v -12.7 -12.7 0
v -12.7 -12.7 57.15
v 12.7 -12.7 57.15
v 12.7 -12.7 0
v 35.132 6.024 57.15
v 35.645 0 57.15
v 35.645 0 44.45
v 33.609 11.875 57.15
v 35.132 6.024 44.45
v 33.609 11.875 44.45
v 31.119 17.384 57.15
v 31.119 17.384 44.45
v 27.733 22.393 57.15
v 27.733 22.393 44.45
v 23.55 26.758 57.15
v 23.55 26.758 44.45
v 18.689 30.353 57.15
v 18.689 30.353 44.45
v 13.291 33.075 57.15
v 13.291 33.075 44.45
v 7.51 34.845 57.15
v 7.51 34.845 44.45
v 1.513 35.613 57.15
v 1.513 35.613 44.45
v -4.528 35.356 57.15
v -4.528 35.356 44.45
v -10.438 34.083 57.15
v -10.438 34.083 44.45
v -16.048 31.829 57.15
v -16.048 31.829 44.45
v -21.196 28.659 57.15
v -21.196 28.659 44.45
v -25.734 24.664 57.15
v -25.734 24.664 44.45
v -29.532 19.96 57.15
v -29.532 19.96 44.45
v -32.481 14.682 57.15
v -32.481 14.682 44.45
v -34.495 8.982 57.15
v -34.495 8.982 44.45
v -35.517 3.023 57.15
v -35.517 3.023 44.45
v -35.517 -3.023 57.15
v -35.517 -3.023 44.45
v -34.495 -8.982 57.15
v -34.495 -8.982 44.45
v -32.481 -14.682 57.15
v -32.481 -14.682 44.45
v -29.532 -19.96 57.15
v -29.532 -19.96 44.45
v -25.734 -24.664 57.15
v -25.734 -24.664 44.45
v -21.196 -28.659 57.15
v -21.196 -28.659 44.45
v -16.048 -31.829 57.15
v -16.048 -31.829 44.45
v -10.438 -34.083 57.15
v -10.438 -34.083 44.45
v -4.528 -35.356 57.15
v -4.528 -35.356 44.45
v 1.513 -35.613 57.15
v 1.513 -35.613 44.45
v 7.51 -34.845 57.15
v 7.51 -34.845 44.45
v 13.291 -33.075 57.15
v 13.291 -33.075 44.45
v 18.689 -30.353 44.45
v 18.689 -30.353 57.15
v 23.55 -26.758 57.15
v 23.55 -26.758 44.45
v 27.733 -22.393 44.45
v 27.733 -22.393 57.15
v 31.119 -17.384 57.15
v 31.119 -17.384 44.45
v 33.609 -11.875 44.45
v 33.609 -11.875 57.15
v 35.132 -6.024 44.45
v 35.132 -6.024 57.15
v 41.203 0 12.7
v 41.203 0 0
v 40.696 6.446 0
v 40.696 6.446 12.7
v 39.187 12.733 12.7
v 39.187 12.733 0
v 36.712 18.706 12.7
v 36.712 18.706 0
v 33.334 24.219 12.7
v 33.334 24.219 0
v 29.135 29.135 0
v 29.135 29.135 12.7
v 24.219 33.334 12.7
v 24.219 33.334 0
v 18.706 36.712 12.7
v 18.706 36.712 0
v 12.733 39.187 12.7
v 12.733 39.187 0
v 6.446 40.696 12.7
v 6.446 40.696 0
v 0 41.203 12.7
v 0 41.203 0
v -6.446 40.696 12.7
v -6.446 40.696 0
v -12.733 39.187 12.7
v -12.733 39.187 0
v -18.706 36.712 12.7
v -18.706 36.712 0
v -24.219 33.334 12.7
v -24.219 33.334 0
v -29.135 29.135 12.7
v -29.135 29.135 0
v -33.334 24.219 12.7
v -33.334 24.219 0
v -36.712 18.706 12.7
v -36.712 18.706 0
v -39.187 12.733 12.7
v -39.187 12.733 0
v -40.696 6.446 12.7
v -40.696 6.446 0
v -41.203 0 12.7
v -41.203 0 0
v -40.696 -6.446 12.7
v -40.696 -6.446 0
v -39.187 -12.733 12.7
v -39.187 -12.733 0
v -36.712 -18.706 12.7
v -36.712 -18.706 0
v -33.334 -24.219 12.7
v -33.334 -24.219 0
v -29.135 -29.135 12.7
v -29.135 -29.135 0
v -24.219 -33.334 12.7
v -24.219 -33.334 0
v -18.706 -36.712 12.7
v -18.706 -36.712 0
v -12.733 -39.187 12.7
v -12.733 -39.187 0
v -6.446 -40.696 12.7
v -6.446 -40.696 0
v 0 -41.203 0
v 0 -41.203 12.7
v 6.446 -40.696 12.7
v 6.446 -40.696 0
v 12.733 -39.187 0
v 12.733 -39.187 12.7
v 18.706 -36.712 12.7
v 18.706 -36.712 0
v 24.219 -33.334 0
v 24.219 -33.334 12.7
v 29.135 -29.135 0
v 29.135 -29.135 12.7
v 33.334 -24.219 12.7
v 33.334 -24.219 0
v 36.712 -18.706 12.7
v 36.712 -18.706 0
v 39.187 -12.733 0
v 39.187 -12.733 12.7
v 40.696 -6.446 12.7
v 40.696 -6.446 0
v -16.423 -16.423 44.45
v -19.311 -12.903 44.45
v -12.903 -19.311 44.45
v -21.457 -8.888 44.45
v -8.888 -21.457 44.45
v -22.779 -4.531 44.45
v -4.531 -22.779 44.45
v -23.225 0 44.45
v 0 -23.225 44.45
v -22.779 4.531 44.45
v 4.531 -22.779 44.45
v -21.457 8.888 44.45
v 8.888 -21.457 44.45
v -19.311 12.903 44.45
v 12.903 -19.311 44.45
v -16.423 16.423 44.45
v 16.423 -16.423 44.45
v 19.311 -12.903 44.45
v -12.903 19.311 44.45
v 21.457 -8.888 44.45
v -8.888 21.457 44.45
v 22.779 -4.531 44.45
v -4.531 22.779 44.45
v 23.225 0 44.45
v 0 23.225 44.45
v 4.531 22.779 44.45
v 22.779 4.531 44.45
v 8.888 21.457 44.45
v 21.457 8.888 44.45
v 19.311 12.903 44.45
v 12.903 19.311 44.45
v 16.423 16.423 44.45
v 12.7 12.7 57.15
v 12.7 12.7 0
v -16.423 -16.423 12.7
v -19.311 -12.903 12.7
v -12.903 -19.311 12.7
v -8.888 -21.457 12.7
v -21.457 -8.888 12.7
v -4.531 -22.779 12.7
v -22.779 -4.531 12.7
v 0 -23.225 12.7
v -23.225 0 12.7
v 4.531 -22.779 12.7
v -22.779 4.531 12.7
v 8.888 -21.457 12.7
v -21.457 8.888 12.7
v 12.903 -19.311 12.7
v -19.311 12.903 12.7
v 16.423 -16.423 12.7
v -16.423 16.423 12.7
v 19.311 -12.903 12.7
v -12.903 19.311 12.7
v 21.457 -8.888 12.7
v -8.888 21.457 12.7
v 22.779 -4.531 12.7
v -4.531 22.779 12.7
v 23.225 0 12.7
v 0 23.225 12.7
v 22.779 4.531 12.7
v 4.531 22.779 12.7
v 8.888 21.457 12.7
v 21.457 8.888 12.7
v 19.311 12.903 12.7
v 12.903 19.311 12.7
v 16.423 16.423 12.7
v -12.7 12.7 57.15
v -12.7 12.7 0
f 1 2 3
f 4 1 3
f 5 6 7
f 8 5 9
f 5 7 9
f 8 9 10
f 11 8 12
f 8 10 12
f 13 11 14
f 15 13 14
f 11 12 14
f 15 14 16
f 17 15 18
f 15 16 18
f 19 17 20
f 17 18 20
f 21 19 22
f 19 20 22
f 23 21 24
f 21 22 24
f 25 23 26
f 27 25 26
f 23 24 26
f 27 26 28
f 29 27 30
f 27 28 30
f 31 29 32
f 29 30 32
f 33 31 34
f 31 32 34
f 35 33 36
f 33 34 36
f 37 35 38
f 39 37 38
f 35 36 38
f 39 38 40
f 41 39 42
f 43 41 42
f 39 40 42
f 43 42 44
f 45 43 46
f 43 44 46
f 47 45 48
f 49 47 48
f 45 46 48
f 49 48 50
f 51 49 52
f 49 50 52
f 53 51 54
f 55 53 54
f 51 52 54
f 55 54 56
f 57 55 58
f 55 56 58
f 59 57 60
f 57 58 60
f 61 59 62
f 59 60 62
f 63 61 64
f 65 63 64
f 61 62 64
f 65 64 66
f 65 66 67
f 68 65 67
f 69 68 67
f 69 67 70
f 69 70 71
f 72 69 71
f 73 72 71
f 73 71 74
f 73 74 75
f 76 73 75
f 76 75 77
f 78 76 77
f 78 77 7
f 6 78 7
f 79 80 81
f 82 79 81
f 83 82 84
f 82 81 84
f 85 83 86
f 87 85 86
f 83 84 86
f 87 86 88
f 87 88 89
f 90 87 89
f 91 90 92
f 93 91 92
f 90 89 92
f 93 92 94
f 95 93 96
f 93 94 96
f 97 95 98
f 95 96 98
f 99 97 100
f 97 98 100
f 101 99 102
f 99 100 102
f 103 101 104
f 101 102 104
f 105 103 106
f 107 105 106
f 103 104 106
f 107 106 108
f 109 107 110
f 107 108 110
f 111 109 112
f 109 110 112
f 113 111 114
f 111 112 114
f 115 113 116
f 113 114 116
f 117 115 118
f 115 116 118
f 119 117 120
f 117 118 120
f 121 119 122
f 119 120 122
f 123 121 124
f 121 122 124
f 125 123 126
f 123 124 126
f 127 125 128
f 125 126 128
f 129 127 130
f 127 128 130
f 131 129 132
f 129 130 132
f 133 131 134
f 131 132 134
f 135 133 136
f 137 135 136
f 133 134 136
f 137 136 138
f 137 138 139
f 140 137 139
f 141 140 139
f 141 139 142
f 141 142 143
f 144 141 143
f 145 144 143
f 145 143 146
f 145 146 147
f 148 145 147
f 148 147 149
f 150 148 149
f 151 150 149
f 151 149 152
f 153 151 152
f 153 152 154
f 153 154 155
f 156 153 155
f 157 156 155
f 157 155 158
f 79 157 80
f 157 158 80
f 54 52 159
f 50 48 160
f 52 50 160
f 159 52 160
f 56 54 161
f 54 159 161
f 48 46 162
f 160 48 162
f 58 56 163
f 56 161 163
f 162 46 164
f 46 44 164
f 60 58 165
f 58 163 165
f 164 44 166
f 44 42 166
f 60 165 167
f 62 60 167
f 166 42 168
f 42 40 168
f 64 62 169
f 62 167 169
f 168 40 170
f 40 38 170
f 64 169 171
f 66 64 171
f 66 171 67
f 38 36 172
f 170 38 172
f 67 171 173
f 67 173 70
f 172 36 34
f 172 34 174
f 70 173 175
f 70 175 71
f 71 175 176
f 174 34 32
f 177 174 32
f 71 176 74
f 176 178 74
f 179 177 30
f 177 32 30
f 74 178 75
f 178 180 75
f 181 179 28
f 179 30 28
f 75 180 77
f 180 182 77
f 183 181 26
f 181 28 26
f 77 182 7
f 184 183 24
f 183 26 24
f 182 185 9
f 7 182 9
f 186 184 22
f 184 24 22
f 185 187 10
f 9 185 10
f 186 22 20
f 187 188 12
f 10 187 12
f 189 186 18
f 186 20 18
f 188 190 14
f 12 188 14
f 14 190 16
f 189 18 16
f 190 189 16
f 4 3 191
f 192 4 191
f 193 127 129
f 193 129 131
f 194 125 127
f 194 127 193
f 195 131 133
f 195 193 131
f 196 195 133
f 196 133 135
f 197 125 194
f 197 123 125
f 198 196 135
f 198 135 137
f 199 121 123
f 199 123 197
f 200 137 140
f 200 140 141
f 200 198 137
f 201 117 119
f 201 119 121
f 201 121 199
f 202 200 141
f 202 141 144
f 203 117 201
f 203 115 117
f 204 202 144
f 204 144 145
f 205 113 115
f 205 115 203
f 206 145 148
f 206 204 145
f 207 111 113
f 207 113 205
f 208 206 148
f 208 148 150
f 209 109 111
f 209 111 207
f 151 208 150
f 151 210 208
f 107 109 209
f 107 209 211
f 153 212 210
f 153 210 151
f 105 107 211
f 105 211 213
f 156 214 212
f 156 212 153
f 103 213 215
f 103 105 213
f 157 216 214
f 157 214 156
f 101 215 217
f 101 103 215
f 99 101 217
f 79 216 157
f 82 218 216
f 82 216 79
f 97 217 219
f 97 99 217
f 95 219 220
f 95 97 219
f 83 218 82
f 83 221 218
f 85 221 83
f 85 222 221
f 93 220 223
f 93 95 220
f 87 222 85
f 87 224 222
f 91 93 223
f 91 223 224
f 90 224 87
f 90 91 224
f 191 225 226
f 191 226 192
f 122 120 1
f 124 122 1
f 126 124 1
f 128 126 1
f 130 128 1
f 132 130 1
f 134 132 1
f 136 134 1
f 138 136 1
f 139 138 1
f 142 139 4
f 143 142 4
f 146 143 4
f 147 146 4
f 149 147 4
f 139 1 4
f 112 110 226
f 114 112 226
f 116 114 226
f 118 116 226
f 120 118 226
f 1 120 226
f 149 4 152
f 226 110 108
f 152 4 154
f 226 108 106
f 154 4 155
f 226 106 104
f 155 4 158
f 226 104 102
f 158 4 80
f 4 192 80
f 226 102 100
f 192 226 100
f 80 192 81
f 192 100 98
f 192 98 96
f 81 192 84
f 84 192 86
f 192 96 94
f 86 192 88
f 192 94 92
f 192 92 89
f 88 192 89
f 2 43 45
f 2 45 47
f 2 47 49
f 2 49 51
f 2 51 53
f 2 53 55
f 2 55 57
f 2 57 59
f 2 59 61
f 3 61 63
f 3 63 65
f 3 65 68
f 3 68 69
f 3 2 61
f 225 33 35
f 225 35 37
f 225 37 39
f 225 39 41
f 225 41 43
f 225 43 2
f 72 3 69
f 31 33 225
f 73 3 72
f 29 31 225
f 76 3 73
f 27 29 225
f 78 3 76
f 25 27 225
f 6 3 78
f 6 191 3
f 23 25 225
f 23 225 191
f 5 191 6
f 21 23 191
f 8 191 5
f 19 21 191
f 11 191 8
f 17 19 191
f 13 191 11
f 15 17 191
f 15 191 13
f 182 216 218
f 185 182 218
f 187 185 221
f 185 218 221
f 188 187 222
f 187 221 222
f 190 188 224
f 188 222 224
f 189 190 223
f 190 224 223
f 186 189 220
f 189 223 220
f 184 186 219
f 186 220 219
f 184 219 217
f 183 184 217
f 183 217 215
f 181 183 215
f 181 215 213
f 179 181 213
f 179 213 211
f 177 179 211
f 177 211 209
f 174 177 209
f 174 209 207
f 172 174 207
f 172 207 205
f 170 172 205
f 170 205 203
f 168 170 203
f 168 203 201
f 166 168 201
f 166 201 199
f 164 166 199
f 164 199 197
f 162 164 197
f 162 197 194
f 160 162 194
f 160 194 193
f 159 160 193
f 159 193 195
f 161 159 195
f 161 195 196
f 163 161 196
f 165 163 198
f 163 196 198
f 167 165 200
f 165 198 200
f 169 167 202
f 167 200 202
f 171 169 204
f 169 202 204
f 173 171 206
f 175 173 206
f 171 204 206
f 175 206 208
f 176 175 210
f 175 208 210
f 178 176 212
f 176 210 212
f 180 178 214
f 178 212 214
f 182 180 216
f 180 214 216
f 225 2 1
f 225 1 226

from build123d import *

# Parameters (mm, degrees)
F0_R     = 41.203312
F1_DEPTH = 12.7
F2_R     = 23.225179
F3_DEPTH = 44.45
F4_R     = 35.645191
F5_DEPTH = 12.7
F6_W     = 25.4
F6_H     = 25.4
F7_DEPTH = 57.151


with BuildPart() as f1:
    # F0 (on Top) → F1 (new body)
    with BuildSketch(Plane.XY):
        Circle(F0_R)
    extrude(amount=F1_DEPTH)

    # F2 (on Top) → F3 (join)
    with BuildSketch(Plane.XY):
        Circle(F2_R)
    extrude(amount=F3_DEPTH)

    # F4 (on face) → F5 (join)
    with BuildSketch(Plane.XY.offset(44.45)):
        Circle(F4_R)
    extrude(amount=F5_DEPTH)

    # F6 (on face) → F7 (cut, through all)
    with BuildSketch(Plane.XY.offset(57.15)):
        Rectangle(F6_W, F6_H)
    extrude(amount=-F7_DEPTH, mode=Mode.SUBTRACT)


solid = f1.part
